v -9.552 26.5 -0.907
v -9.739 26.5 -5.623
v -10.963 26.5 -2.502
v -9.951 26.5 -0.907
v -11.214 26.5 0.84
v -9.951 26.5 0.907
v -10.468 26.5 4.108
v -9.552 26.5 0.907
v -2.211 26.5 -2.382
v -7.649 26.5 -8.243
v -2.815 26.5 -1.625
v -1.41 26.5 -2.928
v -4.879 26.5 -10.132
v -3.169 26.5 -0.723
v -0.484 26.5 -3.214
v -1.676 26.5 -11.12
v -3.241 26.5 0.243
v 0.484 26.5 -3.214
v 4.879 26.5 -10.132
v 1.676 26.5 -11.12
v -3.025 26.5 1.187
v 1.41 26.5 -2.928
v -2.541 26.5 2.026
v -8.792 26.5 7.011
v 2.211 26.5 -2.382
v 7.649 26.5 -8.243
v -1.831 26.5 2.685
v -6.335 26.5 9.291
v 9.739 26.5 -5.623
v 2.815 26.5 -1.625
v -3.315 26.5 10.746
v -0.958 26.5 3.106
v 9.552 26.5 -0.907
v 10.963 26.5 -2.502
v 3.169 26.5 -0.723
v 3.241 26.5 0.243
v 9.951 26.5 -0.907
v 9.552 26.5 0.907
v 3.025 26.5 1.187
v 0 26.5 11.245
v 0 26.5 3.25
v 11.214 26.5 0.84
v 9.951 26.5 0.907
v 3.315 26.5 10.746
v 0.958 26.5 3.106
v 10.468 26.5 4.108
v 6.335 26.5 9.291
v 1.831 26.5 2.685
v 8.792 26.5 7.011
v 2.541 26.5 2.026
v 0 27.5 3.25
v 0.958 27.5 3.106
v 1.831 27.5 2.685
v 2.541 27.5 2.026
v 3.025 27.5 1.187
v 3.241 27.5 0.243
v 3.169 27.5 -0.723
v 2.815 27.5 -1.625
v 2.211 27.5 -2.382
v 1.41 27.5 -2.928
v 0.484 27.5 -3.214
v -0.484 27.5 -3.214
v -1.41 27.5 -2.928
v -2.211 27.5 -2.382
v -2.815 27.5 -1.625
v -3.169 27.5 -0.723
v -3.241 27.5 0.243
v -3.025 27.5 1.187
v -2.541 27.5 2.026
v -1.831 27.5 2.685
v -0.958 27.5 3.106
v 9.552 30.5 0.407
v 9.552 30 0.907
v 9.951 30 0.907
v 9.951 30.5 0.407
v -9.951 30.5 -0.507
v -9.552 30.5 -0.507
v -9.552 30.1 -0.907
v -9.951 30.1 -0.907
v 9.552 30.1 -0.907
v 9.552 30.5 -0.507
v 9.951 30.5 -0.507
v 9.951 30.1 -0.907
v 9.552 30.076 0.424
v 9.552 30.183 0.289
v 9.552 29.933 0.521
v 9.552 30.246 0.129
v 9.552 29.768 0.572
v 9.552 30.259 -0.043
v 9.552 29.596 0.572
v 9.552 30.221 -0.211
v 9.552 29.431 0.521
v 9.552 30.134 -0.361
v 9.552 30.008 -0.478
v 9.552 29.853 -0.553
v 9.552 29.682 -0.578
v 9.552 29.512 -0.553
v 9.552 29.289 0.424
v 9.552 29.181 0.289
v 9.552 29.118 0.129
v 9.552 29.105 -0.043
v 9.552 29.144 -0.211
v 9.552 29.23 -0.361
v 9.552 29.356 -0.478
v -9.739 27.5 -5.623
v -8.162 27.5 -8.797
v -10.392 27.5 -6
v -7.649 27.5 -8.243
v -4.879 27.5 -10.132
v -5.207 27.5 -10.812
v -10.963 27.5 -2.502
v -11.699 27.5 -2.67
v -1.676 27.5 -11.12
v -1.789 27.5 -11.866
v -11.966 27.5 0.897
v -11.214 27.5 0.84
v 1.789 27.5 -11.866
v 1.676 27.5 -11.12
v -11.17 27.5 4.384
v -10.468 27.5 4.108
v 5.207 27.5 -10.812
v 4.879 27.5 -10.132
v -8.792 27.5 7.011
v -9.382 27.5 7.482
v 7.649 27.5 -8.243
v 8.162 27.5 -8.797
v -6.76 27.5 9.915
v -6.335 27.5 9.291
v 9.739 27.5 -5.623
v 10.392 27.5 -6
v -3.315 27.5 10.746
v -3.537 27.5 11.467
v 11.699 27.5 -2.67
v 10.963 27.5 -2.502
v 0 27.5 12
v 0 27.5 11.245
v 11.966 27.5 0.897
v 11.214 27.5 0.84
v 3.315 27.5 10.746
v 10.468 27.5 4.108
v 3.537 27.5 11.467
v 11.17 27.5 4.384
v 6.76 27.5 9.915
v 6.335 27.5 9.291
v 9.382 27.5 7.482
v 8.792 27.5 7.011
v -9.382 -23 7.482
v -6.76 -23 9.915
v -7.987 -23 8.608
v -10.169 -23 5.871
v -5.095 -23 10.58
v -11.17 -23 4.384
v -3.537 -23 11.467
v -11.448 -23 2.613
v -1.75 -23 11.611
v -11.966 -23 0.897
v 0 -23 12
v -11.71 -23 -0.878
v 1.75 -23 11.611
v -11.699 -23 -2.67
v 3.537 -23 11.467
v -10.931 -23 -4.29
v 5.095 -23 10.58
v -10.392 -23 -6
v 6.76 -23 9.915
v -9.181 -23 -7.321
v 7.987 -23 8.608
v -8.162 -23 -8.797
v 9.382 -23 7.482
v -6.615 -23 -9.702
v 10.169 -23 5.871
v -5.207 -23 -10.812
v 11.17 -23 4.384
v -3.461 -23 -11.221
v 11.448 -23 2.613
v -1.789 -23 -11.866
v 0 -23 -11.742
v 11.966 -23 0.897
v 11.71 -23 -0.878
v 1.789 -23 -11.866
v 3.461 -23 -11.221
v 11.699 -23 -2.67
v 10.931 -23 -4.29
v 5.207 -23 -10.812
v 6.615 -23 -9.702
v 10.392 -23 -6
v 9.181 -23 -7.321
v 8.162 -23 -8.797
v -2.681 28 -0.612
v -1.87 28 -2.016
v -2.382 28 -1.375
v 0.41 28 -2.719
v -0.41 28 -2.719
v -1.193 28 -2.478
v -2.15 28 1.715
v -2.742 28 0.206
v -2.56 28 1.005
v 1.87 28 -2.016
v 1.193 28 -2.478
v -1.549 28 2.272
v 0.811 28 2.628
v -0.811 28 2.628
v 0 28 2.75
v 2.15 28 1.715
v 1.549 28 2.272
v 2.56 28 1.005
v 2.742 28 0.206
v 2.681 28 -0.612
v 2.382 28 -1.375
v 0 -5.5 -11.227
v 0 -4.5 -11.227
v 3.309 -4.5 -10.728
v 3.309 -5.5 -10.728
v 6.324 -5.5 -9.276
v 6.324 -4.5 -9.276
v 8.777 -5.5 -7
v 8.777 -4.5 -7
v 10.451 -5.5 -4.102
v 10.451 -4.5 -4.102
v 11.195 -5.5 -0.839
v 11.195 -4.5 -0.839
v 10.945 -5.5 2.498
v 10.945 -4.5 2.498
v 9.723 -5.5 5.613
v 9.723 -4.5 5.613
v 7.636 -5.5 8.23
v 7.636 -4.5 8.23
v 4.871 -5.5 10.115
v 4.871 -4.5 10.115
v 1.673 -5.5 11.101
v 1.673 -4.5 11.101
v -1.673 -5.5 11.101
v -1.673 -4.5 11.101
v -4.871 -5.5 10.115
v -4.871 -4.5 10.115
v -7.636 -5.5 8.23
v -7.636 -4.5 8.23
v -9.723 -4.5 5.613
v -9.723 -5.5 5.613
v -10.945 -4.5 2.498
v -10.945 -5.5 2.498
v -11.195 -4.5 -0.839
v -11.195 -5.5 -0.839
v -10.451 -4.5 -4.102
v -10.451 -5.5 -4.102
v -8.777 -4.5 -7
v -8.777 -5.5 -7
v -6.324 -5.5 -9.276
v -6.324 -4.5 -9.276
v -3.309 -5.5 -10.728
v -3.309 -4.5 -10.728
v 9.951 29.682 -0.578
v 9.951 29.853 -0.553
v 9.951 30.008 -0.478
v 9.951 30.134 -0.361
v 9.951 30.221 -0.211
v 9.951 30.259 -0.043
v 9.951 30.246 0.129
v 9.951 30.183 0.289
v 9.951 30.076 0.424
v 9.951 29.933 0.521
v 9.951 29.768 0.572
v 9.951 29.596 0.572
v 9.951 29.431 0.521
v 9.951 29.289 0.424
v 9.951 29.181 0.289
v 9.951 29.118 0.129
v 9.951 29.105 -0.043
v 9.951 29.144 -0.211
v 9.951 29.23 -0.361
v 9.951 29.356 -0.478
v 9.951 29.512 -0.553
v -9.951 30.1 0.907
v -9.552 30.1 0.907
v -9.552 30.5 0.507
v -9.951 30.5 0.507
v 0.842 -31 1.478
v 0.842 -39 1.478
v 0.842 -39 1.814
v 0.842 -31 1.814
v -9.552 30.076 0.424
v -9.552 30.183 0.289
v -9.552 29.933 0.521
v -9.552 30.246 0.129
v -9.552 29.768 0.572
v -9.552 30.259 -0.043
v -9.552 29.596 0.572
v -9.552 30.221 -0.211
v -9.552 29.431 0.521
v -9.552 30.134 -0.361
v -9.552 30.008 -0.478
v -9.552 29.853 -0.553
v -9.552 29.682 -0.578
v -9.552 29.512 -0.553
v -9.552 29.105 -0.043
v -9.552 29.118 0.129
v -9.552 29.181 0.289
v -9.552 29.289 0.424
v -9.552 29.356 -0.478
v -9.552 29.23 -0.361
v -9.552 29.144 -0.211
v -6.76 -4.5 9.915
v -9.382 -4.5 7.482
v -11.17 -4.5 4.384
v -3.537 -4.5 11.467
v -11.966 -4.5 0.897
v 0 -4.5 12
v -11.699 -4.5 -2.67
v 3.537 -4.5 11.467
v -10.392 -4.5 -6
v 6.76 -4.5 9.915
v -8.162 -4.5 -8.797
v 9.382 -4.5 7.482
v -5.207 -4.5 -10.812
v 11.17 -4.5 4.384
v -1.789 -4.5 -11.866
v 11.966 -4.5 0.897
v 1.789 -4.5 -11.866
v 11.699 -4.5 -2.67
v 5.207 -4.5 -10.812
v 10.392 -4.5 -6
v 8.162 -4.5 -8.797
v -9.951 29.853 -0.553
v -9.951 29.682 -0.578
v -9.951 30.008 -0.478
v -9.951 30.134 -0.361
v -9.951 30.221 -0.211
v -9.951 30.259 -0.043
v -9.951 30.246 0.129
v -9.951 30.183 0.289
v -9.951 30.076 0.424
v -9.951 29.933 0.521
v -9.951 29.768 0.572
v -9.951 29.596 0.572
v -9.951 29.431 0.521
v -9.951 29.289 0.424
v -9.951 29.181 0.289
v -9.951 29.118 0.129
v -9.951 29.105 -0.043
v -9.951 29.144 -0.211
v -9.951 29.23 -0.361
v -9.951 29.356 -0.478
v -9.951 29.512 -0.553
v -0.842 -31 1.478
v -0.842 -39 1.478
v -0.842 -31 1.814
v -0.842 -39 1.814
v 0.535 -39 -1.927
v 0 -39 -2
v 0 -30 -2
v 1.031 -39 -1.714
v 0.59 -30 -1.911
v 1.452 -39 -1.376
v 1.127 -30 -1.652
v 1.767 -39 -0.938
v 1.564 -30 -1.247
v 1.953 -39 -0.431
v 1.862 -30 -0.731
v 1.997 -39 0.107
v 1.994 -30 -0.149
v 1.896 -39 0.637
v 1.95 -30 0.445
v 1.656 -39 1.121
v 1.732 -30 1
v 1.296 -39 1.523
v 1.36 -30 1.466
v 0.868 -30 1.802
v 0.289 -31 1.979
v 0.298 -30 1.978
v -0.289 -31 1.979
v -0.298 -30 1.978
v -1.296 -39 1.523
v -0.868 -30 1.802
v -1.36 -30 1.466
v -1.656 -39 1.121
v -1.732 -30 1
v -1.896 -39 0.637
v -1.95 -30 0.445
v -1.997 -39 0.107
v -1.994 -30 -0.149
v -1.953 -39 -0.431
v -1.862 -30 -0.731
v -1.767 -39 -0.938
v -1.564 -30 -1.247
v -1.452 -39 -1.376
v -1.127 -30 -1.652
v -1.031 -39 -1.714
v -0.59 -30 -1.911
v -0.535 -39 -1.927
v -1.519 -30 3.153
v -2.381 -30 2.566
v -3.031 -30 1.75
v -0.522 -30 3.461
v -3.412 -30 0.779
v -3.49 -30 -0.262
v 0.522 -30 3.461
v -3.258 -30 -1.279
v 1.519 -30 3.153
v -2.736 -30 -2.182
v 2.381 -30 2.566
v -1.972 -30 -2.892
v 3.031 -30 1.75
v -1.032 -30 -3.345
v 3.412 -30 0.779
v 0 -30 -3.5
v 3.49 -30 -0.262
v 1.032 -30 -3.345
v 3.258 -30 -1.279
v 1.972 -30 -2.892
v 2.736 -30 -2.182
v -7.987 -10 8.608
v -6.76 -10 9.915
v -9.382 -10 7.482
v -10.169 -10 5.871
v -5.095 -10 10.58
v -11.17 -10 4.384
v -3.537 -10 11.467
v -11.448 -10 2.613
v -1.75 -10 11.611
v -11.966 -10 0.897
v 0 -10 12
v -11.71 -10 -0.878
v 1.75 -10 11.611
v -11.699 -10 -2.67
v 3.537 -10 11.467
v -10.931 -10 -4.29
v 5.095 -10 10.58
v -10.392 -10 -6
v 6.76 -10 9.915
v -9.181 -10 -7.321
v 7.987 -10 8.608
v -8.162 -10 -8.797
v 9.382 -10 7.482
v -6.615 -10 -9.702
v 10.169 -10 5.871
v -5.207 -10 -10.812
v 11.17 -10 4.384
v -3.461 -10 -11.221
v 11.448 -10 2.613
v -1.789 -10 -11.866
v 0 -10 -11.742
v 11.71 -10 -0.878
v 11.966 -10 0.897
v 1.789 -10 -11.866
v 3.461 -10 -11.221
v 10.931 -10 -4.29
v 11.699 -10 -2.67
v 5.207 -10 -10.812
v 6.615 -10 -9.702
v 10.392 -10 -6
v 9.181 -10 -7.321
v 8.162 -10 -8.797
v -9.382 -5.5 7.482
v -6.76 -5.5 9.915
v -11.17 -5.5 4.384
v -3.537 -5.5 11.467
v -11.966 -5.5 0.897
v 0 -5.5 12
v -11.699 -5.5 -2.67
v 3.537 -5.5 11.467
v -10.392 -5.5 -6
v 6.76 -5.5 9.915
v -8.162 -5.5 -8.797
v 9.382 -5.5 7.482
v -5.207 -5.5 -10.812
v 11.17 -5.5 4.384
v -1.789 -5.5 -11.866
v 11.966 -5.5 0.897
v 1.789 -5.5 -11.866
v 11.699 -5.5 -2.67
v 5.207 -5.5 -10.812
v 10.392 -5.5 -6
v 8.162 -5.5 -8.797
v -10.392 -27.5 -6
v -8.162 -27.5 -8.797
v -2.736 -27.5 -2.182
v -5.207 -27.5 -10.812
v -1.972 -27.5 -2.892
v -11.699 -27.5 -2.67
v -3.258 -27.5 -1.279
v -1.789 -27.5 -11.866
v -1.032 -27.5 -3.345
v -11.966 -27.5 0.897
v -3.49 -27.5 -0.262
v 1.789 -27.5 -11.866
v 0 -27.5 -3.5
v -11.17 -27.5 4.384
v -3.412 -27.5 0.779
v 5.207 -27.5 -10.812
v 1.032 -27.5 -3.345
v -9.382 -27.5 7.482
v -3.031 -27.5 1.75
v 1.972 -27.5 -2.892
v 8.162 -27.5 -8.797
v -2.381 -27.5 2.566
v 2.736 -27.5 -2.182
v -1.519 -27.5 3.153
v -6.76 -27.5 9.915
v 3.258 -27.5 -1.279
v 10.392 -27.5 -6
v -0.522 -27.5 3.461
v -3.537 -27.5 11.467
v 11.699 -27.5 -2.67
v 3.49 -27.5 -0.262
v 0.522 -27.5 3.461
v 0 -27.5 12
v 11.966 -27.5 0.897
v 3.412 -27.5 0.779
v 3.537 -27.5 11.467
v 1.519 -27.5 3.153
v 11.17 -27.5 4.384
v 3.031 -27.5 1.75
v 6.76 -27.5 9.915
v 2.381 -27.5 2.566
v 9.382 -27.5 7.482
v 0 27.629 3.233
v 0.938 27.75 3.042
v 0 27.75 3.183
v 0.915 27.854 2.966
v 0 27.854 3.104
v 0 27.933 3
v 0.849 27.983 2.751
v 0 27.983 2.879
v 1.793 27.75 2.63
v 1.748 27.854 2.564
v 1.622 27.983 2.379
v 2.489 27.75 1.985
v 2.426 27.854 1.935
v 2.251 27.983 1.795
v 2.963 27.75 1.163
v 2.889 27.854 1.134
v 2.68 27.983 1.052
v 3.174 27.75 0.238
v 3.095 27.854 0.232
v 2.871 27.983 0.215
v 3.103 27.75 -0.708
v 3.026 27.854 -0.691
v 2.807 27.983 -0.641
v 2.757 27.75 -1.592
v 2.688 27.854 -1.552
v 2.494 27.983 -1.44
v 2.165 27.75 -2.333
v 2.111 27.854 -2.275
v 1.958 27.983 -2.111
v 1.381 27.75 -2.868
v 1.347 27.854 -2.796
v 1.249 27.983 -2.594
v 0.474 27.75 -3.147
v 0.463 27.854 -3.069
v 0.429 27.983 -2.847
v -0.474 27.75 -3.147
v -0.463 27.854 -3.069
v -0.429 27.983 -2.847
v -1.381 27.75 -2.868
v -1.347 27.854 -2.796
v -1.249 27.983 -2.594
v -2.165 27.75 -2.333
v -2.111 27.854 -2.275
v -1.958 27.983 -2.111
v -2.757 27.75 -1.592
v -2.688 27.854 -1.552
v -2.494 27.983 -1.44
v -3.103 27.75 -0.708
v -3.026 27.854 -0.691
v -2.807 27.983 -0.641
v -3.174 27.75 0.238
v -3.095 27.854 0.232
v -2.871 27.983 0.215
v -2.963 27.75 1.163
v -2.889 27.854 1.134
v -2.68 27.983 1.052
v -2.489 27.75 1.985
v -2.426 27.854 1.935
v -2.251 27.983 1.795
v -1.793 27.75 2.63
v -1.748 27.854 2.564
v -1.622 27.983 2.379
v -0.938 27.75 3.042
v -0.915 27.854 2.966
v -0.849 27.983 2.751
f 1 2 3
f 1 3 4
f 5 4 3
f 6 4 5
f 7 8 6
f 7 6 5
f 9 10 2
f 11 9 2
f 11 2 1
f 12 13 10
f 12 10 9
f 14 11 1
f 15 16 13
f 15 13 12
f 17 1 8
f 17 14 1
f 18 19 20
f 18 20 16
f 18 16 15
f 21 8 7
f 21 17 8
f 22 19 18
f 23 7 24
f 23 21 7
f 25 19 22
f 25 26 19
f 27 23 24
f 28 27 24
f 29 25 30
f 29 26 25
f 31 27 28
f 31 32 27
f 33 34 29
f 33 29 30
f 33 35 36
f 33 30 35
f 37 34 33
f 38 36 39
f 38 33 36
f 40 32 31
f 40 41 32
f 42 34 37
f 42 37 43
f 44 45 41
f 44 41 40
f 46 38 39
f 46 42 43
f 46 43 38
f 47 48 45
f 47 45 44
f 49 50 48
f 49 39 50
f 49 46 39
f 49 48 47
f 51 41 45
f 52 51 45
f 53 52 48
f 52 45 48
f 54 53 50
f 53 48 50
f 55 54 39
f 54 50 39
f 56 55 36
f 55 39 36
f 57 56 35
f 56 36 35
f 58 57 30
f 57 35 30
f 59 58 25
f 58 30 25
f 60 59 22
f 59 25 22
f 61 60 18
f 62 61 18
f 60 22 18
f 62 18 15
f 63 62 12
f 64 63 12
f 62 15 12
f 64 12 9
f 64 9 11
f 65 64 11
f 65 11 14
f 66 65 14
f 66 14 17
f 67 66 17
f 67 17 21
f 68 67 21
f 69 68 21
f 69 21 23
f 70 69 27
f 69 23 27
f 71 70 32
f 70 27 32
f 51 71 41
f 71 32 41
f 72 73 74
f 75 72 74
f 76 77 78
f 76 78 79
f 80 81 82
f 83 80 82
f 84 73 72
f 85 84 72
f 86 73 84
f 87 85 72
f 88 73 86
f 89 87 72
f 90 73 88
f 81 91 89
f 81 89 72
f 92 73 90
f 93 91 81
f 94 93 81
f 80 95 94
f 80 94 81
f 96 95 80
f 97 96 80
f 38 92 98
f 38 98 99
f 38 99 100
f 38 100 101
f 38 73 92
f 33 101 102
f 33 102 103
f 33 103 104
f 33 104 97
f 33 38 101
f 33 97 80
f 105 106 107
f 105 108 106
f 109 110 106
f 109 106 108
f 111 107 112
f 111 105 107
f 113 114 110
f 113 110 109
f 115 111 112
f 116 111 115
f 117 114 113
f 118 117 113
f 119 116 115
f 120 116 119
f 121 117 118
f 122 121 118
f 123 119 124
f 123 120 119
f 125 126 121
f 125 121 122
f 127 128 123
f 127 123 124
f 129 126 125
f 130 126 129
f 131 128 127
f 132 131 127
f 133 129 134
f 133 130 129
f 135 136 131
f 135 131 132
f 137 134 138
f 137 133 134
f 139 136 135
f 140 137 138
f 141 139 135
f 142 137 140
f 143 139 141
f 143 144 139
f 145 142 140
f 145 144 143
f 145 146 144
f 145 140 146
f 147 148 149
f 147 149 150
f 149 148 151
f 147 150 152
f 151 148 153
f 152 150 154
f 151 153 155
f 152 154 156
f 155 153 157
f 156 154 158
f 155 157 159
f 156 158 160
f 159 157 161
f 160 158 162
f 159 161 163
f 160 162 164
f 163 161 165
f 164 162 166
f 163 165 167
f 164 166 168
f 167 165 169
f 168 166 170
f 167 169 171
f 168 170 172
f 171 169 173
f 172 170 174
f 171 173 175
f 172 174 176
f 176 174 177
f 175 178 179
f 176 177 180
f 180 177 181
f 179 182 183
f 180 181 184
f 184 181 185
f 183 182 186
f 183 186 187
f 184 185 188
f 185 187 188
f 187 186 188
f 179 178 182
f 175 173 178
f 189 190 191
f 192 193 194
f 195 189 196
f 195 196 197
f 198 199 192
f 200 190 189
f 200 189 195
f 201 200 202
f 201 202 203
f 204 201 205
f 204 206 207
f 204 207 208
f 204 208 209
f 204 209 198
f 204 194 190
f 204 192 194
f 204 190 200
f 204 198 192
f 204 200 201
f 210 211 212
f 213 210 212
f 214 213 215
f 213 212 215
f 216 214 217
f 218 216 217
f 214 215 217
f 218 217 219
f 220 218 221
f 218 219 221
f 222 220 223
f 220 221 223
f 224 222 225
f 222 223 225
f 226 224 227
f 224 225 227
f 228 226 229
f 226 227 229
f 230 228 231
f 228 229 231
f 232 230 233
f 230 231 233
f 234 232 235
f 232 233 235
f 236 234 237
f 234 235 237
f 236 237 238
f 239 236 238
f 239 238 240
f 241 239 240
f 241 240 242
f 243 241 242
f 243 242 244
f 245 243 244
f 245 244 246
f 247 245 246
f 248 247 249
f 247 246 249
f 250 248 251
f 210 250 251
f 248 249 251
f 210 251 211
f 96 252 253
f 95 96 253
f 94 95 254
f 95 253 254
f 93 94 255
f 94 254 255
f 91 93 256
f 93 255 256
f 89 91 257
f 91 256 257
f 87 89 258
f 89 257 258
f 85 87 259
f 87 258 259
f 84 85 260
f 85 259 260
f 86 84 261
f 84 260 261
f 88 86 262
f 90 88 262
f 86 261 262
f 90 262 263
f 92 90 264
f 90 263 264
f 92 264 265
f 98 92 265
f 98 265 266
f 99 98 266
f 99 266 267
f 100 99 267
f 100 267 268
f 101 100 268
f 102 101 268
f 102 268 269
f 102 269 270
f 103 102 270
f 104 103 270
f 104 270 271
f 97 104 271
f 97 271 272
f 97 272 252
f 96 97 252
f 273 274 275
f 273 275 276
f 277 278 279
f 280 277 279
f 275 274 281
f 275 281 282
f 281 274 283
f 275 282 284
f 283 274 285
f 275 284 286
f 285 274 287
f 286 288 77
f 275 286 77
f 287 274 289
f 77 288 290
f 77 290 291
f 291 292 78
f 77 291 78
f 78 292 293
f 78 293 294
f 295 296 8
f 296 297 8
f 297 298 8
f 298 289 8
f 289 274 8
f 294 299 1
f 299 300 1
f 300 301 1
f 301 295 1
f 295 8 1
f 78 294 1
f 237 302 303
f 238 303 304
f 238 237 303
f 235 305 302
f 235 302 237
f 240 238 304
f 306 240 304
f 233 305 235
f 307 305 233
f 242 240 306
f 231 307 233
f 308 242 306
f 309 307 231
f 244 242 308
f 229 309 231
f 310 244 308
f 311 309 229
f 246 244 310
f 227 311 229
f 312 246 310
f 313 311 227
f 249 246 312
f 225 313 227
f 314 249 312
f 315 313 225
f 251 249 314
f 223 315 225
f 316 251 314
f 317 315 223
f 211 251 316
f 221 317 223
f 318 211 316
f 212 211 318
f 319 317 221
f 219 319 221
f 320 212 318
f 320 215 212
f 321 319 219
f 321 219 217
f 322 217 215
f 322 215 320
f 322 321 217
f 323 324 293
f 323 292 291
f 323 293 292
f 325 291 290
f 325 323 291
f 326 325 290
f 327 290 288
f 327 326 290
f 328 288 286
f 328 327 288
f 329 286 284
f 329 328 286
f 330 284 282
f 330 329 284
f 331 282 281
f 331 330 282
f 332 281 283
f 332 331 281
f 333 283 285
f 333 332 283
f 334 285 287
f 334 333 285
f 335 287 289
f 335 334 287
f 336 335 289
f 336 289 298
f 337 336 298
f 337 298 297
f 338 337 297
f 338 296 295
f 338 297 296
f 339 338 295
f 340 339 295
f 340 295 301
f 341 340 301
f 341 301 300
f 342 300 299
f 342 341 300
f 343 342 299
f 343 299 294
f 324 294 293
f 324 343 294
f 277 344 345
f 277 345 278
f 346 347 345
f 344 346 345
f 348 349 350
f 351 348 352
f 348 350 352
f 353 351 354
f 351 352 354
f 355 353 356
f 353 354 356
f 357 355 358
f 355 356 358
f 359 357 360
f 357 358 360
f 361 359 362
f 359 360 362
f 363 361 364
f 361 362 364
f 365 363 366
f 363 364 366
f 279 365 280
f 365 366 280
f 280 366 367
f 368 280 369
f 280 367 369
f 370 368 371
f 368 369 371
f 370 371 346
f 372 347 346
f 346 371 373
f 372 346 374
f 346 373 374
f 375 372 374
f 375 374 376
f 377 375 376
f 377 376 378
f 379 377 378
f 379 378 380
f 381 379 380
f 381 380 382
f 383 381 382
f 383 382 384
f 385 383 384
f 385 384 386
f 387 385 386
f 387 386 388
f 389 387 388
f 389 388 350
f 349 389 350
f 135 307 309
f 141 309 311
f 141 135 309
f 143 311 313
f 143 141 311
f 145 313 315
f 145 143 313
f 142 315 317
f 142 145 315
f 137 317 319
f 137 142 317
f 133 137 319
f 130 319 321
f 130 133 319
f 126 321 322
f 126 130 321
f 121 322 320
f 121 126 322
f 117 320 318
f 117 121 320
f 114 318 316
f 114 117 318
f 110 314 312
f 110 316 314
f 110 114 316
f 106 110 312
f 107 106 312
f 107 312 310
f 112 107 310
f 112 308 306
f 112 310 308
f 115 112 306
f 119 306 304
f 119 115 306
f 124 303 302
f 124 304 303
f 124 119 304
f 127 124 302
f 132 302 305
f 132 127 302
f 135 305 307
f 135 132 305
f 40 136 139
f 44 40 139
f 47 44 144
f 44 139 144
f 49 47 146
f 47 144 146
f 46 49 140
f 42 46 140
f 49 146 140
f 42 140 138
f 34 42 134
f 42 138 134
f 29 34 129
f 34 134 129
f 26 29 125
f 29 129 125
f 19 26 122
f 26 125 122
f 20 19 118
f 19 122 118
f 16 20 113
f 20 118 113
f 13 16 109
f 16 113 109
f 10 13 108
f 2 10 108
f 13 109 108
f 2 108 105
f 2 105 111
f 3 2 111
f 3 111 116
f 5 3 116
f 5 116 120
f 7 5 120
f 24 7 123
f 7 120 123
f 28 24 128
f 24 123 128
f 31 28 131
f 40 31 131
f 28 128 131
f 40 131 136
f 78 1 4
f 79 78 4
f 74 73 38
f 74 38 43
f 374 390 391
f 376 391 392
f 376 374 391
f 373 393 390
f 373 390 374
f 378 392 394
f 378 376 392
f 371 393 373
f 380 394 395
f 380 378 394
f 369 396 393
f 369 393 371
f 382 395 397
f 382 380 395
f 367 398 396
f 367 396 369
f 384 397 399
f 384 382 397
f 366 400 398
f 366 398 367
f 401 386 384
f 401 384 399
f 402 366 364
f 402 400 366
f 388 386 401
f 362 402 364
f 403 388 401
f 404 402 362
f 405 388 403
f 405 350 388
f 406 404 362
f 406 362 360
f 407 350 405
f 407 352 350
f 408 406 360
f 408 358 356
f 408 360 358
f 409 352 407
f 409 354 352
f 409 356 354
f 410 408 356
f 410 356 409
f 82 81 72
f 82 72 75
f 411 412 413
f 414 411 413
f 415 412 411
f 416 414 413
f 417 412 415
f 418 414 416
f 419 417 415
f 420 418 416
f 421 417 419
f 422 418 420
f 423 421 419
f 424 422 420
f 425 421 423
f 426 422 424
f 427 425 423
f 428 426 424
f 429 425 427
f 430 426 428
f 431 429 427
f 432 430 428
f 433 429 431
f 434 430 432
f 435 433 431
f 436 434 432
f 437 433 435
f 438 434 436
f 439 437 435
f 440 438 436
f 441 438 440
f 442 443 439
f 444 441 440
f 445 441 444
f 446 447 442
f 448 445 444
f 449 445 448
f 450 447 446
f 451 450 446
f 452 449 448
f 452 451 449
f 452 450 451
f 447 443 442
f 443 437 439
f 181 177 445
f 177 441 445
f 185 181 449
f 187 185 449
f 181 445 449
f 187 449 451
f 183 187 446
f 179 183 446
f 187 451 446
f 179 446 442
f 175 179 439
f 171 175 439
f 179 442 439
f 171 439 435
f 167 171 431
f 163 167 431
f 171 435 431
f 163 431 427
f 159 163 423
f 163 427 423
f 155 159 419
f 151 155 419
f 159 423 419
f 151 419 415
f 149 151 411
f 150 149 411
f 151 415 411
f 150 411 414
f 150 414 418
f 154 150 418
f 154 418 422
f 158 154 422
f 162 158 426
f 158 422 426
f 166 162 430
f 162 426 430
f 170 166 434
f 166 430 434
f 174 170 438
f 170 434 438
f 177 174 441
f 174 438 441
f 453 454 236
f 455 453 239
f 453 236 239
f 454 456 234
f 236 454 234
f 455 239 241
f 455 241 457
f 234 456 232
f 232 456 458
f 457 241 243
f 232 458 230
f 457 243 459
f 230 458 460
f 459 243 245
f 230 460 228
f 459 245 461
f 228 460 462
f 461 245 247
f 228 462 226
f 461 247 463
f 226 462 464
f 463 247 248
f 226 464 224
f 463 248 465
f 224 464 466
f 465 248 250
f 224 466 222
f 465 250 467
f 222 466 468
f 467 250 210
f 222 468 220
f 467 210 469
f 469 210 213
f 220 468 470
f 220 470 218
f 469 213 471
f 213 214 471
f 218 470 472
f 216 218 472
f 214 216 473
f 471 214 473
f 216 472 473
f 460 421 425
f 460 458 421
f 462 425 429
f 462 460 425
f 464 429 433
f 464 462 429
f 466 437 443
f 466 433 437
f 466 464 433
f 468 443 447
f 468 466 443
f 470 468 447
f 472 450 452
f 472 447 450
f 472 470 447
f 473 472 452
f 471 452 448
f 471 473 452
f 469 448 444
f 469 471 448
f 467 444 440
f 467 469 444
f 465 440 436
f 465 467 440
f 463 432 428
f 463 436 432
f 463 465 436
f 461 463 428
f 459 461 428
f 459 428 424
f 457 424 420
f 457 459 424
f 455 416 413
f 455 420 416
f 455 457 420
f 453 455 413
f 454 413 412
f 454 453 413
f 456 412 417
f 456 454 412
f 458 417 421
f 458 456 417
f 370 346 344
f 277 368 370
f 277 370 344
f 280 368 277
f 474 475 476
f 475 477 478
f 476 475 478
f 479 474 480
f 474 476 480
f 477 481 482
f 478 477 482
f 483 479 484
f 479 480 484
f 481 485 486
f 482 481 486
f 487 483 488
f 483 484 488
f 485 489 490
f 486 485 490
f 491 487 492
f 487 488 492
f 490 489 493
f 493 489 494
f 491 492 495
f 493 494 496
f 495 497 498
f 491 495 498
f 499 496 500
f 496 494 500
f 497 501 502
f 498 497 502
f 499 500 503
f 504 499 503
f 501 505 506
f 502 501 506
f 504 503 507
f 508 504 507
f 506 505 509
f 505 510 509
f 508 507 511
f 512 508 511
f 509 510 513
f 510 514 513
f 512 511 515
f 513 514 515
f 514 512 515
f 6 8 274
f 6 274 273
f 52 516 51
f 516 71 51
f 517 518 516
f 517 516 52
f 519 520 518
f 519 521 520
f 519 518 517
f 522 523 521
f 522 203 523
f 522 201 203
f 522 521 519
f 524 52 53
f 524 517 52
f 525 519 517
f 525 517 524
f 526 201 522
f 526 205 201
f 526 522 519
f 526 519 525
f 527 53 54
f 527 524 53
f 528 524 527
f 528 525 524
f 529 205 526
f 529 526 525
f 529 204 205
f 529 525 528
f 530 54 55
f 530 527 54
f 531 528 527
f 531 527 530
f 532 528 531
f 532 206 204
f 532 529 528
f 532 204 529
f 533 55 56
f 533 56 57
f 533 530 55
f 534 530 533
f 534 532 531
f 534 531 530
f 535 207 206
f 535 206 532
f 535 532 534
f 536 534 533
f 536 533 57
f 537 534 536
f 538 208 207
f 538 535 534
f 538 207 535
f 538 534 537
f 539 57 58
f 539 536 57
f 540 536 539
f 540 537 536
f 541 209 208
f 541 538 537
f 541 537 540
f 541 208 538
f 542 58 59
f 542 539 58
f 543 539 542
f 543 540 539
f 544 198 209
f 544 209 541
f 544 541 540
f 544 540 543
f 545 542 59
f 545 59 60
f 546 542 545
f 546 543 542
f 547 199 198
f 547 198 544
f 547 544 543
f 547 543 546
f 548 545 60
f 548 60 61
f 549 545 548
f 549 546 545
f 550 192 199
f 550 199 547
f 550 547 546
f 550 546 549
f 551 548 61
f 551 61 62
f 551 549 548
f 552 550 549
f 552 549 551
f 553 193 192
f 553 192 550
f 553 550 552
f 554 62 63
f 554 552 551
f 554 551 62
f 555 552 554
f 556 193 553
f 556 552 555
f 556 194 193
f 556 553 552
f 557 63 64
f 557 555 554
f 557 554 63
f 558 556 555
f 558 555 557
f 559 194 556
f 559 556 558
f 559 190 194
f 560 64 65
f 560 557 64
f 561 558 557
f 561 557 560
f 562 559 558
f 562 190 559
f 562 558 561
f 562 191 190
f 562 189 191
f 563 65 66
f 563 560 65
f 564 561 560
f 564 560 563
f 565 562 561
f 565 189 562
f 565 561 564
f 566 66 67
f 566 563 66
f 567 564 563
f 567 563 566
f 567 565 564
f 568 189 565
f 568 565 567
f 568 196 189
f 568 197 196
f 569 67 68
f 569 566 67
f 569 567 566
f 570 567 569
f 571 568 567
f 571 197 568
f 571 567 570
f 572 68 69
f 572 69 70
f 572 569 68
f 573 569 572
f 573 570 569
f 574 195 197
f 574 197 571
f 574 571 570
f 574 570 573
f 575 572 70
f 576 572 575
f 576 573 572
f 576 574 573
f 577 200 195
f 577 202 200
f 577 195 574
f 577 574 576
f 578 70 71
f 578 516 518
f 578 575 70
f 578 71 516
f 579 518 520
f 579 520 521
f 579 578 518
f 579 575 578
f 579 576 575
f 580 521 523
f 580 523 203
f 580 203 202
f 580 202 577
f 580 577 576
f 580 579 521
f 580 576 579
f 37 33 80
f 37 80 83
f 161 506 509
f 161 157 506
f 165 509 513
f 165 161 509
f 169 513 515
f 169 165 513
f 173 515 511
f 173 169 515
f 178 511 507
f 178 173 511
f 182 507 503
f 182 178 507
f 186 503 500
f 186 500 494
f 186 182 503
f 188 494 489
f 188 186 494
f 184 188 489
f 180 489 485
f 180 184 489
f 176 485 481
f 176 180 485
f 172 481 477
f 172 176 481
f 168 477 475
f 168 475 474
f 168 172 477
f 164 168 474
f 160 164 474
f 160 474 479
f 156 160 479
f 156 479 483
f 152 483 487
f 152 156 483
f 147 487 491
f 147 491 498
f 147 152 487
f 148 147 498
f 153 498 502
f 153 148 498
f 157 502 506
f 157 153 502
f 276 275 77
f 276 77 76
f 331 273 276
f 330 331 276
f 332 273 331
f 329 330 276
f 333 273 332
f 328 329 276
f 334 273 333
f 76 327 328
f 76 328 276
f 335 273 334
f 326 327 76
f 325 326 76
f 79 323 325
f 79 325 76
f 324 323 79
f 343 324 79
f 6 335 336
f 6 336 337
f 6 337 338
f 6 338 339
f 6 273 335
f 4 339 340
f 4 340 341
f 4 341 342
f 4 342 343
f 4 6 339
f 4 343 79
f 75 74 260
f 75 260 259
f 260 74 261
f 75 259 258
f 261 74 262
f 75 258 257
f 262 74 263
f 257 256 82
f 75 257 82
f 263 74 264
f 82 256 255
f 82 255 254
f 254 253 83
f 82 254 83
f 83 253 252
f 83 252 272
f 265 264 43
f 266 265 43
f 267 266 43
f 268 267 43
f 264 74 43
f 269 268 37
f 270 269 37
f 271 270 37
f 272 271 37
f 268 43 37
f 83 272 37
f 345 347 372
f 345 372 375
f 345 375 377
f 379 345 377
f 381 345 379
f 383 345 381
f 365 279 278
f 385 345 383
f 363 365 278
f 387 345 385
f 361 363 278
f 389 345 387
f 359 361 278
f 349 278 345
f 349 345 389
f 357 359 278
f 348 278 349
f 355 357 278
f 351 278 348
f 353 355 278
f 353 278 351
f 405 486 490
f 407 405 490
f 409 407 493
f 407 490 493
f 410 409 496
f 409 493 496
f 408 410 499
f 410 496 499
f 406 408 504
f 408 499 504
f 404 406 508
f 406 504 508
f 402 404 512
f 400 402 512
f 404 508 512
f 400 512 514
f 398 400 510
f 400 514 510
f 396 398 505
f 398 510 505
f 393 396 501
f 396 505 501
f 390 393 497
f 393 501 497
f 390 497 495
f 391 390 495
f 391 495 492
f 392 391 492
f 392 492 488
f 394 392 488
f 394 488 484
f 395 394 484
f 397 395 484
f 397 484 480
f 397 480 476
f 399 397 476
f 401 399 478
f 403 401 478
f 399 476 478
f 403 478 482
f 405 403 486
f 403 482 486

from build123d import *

# Parameters (mm, degrees)
SKETCH2_R           = 12
BOSS_EXTRUDE1_DEPTH = 27.5
SKETCH3_R           = 11.245365849
CUT_EXTRUDE1_DEPTH  = 1
CUT_EXTRUDE2_START  = -23
SKETCH4_R           = 12
SKETCH4_R_2         = 11.226713735
CUT_EXTRUDE2_DEPTH  = 1
CUT_EXTRUDE7_START  = -11
SKETCH5_R           = 12
SKETCH5_R_2         = 11.742388301
CUT_EXTRUDE7_DEPTH  = 6.5
SKETCH6_R           = 3.5
BOSS_EXTRUDE2_DEPTH = 2.5
SKETCH7_R           = 2
BOSS_EXTRUDE3_DEPTH = 9
CUT_EXTRUDE9_DEPTH  = 8
SKETCH9_R           = 3.25
BOSS_EXTRUDE4_DEPTH = 1.5
FILLET2_R           = 0.5
SKETCH10_W          = 0.399131897
SKETCH10_H          = 1.813679108
BOSS_EXTRUDE5_DEPTH = 4
CHAMFER1_SIZE       = 0.4
CHAMFER2_SIZE       = 0.5
SKETCH11_R          = 0.578483289
CUT_EXTRUDE10_DEPTH = 4
CHAMFER3_SIZE       = 0.4
CHAMFER4_SIZE       = 0.4


with BuildPart() as part:
    # Sketch2 → Boss-Extrude1 (new, symmetric)
    with BuildSketch(Plane(origin=(0, 0, 0), x_dir=(1, 0, 0), z_dir=(0, 1, 0))):
        with Locations(Location((0, 0, 0), (0, 0, 270))):
            Circle(SKETCH2_R)
    extrude(amount=BOSS_EXTRUDE1_DEPTH, both=True)

    # Sketch3 → Cut-Extrude1 (cut)
    with BuildSketch(Plane(origin=(0, 27.5, 0), x_dir=(1, 0, 0), z_dir=(0, 1, 0))):
        with Locations(Location((0, 0, 0), (0, 0, 270))):
            Circle(SKETCH3_R)
    extrude(amount=-CUT_EXTRUDE1_DEPTH, mode=Mode.SUBTRACT)

    # Sketch4 → Cut-Extrude2 (cut)
    with BuildSketch(Plane.XZ.offset(27.5).offset(CUT_EXTRUDE2_START)):
        with Locations(Location((0, 0, 0), (0, 0, 270))):
            Circle(SKETCH4_R)
        with Locations(Location((0, 0, 0), (0, 0, 270))):
            Circle(SKETCH4_R_2, mode=Mode.SUBTRACT)
    extrude(amount=CUT_EXTRUDE2_DEPTH, mode=Mode.SUBTRACT)

    # Sketch5 → Cut-Extrude7 (cut, symmetric)
    with BuildSketch(Plane.XZ.offset(27.5).offset(CUT_EXTRUDE7_START)):
        with Locations(Location((0, 0, 0), (0, 0, 270))):
            Circle(SKETCH5_R)
        with Locations(Location((0, 0, 0), (0, 0, 270))):
            Circle(SKETCH5_R_2, mode=Mode.SUBTRACT)
    extrude(amount=CUT_EXTRUDE7_DEPTH, both=True, mode=Mode.SUBTRACT)

    # Sketch6 → Boss-Extrude2 (add)
    with BuildSketch(Plane.XZ.offset(27.5)):
        with Locations(Location((0, 0, 0), (0, 0, 270))):
            Circle(SKETCH6_R)
    extrude(amount=BOSS_EXTRUDE2_DEPTH)

    # Sketch7 → Boss-Extrude3 (add)
    with BuildSketch(Plane.XZ.offset(30)):
        with Locations(Location((0, 0, 0), (0, 0, 270))):
            Circle(SKETCH7_R)
    extrude(amount=BOSS_EXTRUDE3_DEPTH)

    # Sketch8 → Cut-Extrude9 (cut)
    with BuildSketch(Plane.XZ.offset(39)):
        Polygon((0.841690599, 1.659275507), (0.841690599, 2.202635472), (-0.841690599, 2.202635472), (-0.841690599, 1.659275507), (-0.841690599, 1.478155518), (0.841690599, 1.478155518), align=None)
    extrude(amount=-CUT_EXTRUDE9_DEPTH, mode=Mode.SUBTRACT)

    # Sketch9 → Boss-Extrude4 (add)
    with BuildSketch(Plane(origin=(0, 26.5, 0), x_dir=(1, 0, 0), z_dir=(0, 1, 0))):
        with Locations(Location((0, 0, 0), (0, 0, 270))):
            Circle(SKETCH9_R)
    extrude(amount=BOSS_EXTRUDE4_DEPTH)

    # Fillet2
    fillet2_edges = [part.edges().sort_by_distance(p)[0] for p in [
        (0, 28, -3.25),
    ]]
    fillet(fillet2_edges, radius=FILLET2_R)

    # Sketch10 → Boss-Extrude5 (add)
    with BuildSketch(Plane(origin=(0, 26.5, 0), x_dir=(1, 0, 0), z_dir=(0, 1, 0))):
        with Locations((9.751397246, 0)):
            Rectangle(SKETCH10_W, SKETCH10_H)
    boss_extrude5 = extrude(amount=BOSS_EXTRUDE5_DEPTH)

    # Chamfer1
    chamfer1_edges = [part.edges().sort_by_distance(p)[0] for p in [
        (9.751397246, 30.5, -0.906839554),
    ]]
    chamfer(chamfer1_edges, length=CHAMFER1_SIZE)

    # Chamfer2
    chamfer2_edges = [part.edges().sort_by_distance(p)[0] for p in [
        (9.751397246, 30.5, 0.906839554),
    ]]
    chamfer(chamfer2_edges, length=CHAMFER2_SIZE)

    # Sketch11 → Cut-Extrude10 (cut)
    with BuildSketch(Plane(origin=(9.950963194, 0, 0), x_dir=(0, 0, -1), z_dir=(1, 0, 0))):
        with Locations((0, 29.682123993)):
            Circle(SKETCH11_R)
    cut_extrude10 = extrude(amount=-CUT_EXTRUDE10_DEPTH, mode=Mode.SUBTRACT)

    # Mirror1: Boss-Extrude5 across plane
    add(boss_extrude5.mirror(Plane(origin=(0, 0, 0), x_dir=(0, 0, 1), z_dir=(1, 0, 0))))

    # Mirror5: Cut-Extrude10 across plane
    add(cut_extrude10.mirror(Plane(origin=(0, 0, 0), x_dir=(0, 0, 1), z_dir=(1, 0, 0))), mode=Mode.SUBTRACT)

    # Chamfer3
    chamfer3_edges = [part.edges().sort_by_distance(p)[0] for p in [
        (-9.751397246, 30.5, -0.906839554),
    ]]
    chamfer(chamfer3_edges, length=CHAMFER3_SIZE)

    # Chamfer4
    chamfer4_edges = [part.edges().sort_by_distance(p)[0] for p in [
        (-9.751397246, 30.5, 0.906839554),
    ]]
    chamfer(chamfer4_edges, length=CHAMFER4_SIZE)


solid = part.part
